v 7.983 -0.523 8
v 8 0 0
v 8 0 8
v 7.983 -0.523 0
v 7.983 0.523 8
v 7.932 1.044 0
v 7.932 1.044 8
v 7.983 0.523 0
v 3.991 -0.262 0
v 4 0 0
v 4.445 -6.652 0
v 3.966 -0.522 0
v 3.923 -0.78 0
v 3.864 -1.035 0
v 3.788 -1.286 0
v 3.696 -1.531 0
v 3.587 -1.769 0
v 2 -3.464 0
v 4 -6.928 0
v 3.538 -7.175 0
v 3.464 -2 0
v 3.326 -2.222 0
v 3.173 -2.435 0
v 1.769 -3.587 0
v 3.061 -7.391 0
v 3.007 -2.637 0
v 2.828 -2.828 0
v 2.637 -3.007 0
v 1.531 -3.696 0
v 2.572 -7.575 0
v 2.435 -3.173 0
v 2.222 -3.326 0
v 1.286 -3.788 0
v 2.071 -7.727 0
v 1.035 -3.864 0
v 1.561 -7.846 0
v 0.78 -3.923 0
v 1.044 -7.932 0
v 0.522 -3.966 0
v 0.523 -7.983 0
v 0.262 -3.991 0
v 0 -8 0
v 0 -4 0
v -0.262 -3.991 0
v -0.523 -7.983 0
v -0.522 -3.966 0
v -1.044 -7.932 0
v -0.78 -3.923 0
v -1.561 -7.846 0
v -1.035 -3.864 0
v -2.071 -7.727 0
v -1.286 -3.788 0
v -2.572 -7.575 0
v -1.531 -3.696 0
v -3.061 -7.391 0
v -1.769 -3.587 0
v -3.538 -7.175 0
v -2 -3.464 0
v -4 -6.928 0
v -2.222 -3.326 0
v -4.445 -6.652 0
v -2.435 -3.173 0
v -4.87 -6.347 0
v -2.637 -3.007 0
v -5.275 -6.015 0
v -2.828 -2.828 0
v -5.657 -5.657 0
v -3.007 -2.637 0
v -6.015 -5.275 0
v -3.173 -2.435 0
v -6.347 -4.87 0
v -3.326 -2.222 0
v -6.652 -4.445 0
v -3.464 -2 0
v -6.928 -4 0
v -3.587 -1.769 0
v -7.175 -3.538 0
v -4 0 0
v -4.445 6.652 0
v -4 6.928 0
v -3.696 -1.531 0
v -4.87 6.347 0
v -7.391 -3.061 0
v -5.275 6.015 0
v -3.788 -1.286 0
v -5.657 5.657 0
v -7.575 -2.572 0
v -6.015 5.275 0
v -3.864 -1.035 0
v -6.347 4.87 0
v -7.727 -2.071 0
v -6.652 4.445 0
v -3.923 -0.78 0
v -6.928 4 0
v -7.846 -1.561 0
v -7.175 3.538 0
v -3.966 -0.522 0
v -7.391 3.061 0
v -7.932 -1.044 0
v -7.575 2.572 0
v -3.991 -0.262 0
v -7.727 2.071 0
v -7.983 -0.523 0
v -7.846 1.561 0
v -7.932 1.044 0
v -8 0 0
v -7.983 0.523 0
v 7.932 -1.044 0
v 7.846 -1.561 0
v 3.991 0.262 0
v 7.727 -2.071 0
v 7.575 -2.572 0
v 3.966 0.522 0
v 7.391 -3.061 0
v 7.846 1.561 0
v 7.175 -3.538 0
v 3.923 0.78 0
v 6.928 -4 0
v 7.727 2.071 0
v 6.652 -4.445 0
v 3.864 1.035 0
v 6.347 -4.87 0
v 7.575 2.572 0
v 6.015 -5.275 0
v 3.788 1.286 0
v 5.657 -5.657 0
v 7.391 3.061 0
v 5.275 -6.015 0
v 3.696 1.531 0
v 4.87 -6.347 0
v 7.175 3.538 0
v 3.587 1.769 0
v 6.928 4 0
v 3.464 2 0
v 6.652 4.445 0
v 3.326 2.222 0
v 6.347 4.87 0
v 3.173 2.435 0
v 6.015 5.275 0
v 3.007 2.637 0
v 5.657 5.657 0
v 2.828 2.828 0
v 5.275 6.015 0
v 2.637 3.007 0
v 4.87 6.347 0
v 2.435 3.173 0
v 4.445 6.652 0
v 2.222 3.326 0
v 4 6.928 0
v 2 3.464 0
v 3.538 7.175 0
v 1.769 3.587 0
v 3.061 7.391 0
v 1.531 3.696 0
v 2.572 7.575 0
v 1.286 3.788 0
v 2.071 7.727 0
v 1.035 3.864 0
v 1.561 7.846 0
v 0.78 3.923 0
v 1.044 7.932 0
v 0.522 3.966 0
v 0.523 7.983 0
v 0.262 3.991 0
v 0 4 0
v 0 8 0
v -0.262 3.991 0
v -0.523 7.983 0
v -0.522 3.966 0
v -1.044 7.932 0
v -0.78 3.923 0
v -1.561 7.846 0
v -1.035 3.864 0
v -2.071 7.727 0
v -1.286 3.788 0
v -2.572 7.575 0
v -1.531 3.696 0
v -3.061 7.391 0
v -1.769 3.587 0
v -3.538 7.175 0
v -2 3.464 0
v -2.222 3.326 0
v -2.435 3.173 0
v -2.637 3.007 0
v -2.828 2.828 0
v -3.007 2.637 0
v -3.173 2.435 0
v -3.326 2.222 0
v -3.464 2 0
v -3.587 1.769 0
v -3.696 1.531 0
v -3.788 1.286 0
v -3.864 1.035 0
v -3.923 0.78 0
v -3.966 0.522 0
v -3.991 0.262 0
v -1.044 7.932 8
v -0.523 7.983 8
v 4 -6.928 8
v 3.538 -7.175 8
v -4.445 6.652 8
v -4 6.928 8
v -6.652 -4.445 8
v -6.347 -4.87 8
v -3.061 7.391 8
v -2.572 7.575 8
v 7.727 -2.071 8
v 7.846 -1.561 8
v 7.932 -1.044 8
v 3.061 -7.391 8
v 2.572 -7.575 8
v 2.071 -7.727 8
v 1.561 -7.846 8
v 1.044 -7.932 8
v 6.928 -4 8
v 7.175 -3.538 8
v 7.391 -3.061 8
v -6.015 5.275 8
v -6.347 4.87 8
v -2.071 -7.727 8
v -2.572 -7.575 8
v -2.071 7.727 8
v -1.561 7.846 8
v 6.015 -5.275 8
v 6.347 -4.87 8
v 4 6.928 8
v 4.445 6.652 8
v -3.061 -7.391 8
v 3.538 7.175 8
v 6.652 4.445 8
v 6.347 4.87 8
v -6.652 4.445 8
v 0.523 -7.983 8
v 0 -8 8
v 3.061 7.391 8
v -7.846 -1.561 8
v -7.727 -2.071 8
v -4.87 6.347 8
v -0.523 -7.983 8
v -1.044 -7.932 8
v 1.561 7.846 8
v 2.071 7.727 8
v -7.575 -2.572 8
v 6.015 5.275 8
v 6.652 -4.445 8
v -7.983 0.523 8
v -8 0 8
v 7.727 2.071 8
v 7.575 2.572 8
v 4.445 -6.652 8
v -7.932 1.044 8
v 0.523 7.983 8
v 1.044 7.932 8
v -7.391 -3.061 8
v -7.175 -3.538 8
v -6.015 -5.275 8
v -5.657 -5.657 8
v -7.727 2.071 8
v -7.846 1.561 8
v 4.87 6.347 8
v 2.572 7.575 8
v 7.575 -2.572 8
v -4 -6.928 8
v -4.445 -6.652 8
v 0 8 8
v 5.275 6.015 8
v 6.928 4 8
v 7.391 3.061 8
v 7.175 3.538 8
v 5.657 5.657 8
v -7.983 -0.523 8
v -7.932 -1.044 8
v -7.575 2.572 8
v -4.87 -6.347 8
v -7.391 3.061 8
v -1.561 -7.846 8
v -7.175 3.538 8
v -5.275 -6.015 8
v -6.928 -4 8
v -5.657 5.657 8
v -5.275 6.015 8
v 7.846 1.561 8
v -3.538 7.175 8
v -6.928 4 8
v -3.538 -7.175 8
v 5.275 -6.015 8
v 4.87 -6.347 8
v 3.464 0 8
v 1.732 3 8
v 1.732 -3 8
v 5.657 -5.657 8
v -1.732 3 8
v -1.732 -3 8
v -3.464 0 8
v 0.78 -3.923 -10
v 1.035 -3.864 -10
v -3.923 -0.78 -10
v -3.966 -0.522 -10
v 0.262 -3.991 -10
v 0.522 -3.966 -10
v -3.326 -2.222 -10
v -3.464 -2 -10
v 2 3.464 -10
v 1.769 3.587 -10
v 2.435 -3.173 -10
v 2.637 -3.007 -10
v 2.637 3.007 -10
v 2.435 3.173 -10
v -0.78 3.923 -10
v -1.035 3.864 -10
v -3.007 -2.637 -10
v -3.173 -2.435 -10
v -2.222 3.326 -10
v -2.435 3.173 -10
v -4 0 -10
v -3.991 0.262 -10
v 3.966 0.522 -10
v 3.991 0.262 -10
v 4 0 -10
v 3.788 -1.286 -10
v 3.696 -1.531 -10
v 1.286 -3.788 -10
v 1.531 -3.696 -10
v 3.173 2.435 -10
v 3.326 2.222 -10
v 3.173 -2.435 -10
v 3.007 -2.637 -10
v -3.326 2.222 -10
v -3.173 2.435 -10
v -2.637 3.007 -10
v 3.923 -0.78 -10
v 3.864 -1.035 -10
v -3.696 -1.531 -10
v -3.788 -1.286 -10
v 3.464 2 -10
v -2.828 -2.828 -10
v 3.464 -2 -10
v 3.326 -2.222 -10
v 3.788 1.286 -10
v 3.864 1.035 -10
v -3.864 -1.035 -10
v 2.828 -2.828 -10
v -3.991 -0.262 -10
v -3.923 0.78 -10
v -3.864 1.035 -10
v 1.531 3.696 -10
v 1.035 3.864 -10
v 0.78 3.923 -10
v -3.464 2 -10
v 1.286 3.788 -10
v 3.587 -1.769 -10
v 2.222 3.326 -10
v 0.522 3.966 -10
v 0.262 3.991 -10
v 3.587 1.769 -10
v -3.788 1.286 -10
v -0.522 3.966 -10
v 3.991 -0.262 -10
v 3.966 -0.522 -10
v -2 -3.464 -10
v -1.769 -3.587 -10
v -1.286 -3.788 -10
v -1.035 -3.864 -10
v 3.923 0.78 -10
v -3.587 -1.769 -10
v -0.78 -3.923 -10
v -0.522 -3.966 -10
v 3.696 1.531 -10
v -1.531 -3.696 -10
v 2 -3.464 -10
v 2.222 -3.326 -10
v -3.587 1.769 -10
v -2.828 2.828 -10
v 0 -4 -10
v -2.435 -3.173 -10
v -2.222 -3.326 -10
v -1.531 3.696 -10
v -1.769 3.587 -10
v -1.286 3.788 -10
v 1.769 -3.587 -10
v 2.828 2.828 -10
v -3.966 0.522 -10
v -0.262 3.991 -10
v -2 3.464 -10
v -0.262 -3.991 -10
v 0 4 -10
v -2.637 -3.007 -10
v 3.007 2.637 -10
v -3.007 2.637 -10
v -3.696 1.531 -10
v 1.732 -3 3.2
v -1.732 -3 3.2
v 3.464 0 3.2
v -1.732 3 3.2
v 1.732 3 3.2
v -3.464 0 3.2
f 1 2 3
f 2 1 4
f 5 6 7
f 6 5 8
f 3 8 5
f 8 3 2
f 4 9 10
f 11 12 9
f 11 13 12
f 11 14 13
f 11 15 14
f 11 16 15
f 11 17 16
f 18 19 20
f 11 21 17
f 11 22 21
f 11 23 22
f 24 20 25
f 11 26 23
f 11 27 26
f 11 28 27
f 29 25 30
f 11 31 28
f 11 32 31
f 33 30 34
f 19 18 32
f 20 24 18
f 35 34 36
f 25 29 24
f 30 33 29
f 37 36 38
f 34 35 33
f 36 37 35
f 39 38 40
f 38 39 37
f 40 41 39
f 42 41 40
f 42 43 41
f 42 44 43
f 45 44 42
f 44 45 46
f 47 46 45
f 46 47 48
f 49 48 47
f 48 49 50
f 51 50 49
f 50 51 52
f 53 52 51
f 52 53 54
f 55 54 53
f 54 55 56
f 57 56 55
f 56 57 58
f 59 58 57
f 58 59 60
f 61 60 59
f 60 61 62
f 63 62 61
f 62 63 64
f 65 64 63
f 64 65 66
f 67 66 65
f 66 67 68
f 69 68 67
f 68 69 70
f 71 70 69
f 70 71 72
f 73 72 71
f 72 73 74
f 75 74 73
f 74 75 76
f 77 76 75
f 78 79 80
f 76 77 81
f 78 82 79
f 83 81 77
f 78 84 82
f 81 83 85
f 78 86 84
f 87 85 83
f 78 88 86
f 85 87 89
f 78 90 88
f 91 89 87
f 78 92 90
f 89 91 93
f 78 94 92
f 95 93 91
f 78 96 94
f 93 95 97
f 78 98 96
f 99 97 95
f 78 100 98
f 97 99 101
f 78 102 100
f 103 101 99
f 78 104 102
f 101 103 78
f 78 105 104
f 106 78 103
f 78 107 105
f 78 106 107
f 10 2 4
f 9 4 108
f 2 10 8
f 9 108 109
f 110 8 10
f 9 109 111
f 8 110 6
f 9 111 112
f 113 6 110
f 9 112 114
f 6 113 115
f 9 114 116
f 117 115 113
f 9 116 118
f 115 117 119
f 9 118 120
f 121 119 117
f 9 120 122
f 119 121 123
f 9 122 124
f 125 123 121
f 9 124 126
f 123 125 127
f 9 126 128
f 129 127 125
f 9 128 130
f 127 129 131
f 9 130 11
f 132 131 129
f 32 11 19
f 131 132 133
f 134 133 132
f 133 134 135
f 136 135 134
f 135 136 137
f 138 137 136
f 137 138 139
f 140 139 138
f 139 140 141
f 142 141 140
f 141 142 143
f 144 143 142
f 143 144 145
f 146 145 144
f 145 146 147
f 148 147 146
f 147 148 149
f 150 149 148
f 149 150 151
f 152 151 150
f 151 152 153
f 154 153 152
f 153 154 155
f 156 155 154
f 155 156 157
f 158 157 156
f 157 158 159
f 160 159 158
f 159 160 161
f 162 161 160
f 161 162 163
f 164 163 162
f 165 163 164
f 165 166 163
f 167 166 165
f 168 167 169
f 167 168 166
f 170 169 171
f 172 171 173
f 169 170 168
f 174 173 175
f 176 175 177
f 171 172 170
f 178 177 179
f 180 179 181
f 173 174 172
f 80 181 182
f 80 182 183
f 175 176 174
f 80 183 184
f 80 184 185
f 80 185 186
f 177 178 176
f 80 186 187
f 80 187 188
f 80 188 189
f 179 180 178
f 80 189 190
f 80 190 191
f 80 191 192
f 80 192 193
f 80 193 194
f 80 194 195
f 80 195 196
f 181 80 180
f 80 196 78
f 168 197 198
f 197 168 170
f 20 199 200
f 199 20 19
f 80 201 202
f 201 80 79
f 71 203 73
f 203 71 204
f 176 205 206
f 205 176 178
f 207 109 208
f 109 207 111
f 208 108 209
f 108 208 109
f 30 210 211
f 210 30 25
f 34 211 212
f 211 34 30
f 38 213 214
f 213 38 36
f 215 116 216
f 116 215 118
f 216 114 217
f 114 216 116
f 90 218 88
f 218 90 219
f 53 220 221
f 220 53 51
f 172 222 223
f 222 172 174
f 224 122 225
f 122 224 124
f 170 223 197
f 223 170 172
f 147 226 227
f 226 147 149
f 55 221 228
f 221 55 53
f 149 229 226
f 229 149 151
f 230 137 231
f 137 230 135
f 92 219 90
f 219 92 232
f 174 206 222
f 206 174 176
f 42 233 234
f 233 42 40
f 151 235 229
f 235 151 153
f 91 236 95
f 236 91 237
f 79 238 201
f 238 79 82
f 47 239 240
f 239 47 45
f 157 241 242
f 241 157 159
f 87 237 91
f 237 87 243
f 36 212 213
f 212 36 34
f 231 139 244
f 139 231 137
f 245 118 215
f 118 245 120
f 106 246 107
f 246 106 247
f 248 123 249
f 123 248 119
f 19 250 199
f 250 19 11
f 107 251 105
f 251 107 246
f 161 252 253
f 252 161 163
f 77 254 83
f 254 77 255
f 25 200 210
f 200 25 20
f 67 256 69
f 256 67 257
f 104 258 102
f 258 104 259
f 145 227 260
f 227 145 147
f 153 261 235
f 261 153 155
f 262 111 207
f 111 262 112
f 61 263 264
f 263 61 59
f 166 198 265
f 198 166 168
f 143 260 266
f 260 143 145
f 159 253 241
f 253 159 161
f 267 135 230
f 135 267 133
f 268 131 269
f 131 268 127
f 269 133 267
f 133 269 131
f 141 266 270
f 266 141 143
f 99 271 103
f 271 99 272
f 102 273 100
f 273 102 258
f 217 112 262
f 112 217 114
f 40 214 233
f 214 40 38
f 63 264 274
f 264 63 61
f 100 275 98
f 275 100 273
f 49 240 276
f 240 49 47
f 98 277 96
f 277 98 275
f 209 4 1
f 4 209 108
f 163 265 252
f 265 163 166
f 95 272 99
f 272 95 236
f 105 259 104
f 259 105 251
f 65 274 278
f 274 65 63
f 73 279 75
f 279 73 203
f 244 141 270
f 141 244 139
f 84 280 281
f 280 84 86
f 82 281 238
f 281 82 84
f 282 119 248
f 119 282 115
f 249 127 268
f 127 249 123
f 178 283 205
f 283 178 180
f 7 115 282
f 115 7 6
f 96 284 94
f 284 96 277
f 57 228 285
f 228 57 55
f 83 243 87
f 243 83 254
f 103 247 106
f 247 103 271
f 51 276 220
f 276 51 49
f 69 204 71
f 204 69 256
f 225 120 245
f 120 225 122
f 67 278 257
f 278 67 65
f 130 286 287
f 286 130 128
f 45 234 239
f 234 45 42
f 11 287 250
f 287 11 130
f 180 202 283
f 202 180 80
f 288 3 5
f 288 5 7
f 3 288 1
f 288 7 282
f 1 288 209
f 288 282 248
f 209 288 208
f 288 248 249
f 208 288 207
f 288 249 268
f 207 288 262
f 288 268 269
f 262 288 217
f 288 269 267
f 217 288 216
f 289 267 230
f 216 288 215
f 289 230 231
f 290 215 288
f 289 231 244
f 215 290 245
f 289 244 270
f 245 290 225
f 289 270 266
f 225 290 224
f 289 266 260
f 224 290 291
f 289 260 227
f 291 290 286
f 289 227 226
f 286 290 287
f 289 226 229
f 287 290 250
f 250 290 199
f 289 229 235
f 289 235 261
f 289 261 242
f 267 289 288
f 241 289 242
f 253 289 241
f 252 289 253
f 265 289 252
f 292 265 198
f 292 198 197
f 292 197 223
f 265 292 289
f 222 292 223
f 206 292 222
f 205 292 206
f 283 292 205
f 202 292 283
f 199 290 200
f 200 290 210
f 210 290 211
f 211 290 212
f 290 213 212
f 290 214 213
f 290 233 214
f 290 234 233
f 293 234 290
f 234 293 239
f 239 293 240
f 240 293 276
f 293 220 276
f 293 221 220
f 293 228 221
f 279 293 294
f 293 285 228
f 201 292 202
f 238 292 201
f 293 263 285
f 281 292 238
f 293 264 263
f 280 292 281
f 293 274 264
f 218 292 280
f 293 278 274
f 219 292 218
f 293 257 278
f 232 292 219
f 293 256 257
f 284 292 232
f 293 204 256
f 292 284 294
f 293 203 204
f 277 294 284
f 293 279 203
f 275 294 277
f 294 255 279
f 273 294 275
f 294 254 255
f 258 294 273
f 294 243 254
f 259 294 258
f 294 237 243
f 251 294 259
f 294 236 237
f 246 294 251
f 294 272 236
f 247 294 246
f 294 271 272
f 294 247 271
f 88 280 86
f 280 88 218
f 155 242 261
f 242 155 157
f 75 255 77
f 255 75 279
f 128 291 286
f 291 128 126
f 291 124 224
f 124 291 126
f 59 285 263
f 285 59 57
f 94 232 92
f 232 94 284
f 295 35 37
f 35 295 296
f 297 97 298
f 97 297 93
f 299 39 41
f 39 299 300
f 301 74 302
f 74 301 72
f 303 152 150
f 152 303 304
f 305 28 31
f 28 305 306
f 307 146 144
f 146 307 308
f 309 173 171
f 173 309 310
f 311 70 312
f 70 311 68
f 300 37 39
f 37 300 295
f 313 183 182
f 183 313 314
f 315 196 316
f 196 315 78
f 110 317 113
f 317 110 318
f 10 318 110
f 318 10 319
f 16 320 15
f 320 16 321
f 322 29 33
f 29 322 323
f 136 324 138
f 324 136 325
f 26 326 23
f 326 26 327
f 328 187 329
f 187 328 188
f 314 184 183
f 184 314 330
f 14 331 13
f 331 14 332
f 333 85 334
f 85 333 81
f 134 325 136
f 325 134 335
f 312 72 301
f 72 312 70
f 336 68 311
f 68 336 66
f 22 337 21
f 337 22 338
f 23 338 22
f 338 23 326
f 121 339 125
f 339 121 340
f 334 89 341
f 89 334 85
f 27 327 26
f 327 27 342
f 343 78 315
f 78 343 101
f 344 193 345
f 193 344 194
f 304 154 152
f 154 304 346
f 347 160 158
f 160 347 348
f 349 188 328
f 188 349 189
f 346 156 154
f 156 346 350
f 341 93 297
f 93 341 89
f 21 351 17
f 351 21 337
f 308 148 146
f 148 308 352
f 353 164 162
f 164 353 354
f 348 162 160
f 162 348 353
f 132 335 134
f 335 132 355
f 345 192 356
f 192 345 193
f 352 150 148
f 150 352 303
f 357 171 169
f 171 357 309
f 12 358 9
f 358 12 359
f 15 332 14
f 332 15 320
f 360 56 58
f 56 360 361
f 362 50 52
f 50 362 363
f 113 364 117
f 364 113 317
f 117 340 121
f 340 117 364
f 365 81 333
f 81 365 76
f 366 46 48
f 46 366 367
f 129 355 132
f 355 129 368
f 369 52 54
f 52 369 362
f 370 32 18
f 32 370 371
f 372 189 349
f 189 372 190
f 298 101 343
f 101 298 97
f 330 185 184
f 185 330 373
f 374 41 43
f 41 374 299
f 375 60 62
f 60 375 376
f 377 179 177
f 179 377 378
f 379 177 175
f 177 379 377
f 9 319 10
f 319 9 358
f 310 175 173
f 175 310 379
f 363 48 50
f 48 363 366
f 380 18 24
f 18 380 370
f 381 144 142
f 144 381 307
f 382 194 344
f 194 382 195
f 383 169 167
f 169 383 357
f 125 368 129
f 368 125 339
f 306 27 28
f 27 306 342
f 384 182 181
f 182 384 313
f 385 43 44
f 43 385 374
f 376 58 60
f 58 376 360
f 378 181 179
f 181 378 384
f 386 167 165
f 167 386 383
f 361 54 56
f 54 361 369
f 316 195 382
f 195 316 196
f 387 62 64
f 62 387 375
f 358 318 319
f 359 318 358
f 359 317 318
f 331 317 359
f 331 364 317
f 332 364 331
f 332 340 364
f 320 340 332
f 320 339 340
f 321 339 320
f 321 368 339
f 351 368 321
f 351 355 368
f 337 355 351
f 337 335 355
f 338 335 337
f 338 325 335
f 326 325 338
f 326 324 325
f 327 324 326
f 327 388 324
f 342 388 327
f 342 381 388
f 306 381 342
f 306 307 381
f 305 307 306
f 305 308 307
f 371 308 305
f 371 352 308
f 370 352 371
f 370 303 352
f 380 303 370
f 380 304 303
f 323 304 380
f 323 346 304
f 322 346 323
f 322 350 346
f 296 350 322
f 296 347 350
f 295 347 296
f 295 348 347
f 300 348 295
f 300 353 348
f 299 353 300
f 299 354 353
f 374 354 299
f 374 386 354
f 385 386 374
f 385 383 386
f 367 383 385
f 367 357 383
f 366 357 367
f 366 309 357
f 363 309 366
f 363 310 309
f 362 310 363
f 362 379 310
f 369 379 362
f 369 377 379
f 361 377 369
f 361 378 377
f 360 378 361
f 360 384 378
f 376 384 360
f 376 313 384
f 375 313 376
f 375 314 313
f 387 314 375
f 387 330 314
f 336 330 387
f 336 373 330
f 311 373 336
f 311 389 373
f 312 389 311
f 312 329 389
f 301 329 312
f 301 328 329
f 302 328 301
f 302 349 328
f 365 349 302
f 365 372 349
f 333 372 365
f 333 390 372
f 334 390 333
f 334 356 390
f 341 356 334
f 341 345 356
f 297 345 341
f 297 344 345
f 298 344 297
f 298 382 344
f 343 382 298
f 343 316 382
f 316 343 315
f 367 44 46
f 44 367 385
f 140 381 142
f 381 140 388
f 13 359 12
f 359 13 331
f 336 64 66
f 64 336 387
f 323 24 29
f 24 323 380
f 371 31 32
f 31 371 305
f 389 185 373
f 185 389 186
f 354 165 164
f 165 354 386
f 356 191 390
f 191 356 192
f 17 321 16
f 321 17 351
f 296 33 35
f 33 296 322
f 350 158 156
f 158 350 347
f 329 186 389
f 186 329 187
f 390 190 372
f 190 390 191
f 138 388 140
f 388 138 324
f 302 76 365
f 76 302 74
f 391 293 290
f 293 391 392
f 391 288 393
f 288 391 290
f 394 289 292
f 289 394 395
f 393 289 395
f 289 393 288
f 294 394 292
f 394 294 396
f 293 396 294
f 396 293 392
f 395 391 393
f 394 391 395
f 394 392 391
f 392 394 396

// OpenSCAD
// Parameters
thread_diameter_mm = 8.0; //[4.0:16.0:0.5]
length_mm = 10.0; //[5.0:40.0:0.5]              // shank length (under head)
head_diameter_mm = 16.0; //[8.0:32.0:0.5]
head_height_mm = 8.0; //[4.0:16.0:0.5]
socket_af_mm = 6.0; //[3.0:12.0:0.5]            // hex across flats
socket_depth_mm = 4.0; //[2.0:10.0:0.5]
tip_chamfer_height_mm = 1.0; //[0.0:3.0:0.25]
overlap_mm = 0.8; //[0.2:2.0:0.1]
washer_enabled = 0; //[0:1:1]
washer_outer_diameter_mm = 16.0; //[10.0:32.0:0.5]
washer_thickness_mm = 1.6; //[0.0:4.0:0.2]
washer_hole_clearance_mm = 0.6; //[0.2:1.5:0.1]

$fn = 96;

// Helpers
function hex_circumradius_from_af(af) = af / (2*cos(30)); // r such that across-flats = af

// Socket head cap screw (one connected solid)
module socket_head_cap_screw() {
    head_r  = head_diameter_mm/2;
    shank_r = thread_diameter_mm/2;

    // Coordinate system: underside of head at z=0, head extends +Z, shank extends -Z
    head_z0 = 0;
    head_z1 = head_height_mm;
    shank_z0 = -length_mm;
    shank_z1 = 0;

    difference() {
        union() {
            // Head (connected to shank at z=0)
            translate([0,0,(head_z0+head_z1)/2])
                cylinder(r=head_r, h=head_height_mm, center=true);

            // Shank (threaded portion approximated as cylinder)
            translate([0,0,(shank_z0+shank_z1)/2])
                cylinder(r=shank_r, h=length_mm, center=true);

            // Tip chamfer (kept connected by overlap into shank)
            if (tip_chamfer_height_mm > 0)
                translate([0,0, shank_z0 + tip_chamfer_height_mm/2 + overlap_mm/2])
                    cylinder(r1=shank_r, r2=0, h=tip_chamfer_height_mm + overlap_mm, center=true);
        }

        // Hex socket recess (subtracted from top of head; recessed, not floating)
        socket_r = hex_circumradius_from_af(socket_af_mm);
        socket_depth = min(socket_depth_mm, head_height_mm - 0.2);
        translate([0,0, head_z1 - socket_depth/2])
            cylinder(r=socket_r, h=socket_depth + 2*overlap_mm, center=true, $fn=6);
    }
}

// Optional washer (kept connected if enabled)
module washer_connected() {
    if (washer_enabled) {
        // Washer sits directly under head, overlapping slightly into head to ensure connectivity
        washer_z = -washer_thickness_mm/2 + overlap_mm/2;
        difference() {
            translate([0,0,washer_z])
                cylinder(r=washer_outer_diameter_mm/2, h=washer_thickness_mm, center=true);
            translate([0,0,washer_z])
                cylinder(r=(thread_diameter_mm + washer_hole_clearance_mm)/2,
                         h=washer_thickness_mm + 2*overlap_mm, center=true);
        }
    }
}

union() {
    socket_head_cap_screw();
    washer_connected();
}
